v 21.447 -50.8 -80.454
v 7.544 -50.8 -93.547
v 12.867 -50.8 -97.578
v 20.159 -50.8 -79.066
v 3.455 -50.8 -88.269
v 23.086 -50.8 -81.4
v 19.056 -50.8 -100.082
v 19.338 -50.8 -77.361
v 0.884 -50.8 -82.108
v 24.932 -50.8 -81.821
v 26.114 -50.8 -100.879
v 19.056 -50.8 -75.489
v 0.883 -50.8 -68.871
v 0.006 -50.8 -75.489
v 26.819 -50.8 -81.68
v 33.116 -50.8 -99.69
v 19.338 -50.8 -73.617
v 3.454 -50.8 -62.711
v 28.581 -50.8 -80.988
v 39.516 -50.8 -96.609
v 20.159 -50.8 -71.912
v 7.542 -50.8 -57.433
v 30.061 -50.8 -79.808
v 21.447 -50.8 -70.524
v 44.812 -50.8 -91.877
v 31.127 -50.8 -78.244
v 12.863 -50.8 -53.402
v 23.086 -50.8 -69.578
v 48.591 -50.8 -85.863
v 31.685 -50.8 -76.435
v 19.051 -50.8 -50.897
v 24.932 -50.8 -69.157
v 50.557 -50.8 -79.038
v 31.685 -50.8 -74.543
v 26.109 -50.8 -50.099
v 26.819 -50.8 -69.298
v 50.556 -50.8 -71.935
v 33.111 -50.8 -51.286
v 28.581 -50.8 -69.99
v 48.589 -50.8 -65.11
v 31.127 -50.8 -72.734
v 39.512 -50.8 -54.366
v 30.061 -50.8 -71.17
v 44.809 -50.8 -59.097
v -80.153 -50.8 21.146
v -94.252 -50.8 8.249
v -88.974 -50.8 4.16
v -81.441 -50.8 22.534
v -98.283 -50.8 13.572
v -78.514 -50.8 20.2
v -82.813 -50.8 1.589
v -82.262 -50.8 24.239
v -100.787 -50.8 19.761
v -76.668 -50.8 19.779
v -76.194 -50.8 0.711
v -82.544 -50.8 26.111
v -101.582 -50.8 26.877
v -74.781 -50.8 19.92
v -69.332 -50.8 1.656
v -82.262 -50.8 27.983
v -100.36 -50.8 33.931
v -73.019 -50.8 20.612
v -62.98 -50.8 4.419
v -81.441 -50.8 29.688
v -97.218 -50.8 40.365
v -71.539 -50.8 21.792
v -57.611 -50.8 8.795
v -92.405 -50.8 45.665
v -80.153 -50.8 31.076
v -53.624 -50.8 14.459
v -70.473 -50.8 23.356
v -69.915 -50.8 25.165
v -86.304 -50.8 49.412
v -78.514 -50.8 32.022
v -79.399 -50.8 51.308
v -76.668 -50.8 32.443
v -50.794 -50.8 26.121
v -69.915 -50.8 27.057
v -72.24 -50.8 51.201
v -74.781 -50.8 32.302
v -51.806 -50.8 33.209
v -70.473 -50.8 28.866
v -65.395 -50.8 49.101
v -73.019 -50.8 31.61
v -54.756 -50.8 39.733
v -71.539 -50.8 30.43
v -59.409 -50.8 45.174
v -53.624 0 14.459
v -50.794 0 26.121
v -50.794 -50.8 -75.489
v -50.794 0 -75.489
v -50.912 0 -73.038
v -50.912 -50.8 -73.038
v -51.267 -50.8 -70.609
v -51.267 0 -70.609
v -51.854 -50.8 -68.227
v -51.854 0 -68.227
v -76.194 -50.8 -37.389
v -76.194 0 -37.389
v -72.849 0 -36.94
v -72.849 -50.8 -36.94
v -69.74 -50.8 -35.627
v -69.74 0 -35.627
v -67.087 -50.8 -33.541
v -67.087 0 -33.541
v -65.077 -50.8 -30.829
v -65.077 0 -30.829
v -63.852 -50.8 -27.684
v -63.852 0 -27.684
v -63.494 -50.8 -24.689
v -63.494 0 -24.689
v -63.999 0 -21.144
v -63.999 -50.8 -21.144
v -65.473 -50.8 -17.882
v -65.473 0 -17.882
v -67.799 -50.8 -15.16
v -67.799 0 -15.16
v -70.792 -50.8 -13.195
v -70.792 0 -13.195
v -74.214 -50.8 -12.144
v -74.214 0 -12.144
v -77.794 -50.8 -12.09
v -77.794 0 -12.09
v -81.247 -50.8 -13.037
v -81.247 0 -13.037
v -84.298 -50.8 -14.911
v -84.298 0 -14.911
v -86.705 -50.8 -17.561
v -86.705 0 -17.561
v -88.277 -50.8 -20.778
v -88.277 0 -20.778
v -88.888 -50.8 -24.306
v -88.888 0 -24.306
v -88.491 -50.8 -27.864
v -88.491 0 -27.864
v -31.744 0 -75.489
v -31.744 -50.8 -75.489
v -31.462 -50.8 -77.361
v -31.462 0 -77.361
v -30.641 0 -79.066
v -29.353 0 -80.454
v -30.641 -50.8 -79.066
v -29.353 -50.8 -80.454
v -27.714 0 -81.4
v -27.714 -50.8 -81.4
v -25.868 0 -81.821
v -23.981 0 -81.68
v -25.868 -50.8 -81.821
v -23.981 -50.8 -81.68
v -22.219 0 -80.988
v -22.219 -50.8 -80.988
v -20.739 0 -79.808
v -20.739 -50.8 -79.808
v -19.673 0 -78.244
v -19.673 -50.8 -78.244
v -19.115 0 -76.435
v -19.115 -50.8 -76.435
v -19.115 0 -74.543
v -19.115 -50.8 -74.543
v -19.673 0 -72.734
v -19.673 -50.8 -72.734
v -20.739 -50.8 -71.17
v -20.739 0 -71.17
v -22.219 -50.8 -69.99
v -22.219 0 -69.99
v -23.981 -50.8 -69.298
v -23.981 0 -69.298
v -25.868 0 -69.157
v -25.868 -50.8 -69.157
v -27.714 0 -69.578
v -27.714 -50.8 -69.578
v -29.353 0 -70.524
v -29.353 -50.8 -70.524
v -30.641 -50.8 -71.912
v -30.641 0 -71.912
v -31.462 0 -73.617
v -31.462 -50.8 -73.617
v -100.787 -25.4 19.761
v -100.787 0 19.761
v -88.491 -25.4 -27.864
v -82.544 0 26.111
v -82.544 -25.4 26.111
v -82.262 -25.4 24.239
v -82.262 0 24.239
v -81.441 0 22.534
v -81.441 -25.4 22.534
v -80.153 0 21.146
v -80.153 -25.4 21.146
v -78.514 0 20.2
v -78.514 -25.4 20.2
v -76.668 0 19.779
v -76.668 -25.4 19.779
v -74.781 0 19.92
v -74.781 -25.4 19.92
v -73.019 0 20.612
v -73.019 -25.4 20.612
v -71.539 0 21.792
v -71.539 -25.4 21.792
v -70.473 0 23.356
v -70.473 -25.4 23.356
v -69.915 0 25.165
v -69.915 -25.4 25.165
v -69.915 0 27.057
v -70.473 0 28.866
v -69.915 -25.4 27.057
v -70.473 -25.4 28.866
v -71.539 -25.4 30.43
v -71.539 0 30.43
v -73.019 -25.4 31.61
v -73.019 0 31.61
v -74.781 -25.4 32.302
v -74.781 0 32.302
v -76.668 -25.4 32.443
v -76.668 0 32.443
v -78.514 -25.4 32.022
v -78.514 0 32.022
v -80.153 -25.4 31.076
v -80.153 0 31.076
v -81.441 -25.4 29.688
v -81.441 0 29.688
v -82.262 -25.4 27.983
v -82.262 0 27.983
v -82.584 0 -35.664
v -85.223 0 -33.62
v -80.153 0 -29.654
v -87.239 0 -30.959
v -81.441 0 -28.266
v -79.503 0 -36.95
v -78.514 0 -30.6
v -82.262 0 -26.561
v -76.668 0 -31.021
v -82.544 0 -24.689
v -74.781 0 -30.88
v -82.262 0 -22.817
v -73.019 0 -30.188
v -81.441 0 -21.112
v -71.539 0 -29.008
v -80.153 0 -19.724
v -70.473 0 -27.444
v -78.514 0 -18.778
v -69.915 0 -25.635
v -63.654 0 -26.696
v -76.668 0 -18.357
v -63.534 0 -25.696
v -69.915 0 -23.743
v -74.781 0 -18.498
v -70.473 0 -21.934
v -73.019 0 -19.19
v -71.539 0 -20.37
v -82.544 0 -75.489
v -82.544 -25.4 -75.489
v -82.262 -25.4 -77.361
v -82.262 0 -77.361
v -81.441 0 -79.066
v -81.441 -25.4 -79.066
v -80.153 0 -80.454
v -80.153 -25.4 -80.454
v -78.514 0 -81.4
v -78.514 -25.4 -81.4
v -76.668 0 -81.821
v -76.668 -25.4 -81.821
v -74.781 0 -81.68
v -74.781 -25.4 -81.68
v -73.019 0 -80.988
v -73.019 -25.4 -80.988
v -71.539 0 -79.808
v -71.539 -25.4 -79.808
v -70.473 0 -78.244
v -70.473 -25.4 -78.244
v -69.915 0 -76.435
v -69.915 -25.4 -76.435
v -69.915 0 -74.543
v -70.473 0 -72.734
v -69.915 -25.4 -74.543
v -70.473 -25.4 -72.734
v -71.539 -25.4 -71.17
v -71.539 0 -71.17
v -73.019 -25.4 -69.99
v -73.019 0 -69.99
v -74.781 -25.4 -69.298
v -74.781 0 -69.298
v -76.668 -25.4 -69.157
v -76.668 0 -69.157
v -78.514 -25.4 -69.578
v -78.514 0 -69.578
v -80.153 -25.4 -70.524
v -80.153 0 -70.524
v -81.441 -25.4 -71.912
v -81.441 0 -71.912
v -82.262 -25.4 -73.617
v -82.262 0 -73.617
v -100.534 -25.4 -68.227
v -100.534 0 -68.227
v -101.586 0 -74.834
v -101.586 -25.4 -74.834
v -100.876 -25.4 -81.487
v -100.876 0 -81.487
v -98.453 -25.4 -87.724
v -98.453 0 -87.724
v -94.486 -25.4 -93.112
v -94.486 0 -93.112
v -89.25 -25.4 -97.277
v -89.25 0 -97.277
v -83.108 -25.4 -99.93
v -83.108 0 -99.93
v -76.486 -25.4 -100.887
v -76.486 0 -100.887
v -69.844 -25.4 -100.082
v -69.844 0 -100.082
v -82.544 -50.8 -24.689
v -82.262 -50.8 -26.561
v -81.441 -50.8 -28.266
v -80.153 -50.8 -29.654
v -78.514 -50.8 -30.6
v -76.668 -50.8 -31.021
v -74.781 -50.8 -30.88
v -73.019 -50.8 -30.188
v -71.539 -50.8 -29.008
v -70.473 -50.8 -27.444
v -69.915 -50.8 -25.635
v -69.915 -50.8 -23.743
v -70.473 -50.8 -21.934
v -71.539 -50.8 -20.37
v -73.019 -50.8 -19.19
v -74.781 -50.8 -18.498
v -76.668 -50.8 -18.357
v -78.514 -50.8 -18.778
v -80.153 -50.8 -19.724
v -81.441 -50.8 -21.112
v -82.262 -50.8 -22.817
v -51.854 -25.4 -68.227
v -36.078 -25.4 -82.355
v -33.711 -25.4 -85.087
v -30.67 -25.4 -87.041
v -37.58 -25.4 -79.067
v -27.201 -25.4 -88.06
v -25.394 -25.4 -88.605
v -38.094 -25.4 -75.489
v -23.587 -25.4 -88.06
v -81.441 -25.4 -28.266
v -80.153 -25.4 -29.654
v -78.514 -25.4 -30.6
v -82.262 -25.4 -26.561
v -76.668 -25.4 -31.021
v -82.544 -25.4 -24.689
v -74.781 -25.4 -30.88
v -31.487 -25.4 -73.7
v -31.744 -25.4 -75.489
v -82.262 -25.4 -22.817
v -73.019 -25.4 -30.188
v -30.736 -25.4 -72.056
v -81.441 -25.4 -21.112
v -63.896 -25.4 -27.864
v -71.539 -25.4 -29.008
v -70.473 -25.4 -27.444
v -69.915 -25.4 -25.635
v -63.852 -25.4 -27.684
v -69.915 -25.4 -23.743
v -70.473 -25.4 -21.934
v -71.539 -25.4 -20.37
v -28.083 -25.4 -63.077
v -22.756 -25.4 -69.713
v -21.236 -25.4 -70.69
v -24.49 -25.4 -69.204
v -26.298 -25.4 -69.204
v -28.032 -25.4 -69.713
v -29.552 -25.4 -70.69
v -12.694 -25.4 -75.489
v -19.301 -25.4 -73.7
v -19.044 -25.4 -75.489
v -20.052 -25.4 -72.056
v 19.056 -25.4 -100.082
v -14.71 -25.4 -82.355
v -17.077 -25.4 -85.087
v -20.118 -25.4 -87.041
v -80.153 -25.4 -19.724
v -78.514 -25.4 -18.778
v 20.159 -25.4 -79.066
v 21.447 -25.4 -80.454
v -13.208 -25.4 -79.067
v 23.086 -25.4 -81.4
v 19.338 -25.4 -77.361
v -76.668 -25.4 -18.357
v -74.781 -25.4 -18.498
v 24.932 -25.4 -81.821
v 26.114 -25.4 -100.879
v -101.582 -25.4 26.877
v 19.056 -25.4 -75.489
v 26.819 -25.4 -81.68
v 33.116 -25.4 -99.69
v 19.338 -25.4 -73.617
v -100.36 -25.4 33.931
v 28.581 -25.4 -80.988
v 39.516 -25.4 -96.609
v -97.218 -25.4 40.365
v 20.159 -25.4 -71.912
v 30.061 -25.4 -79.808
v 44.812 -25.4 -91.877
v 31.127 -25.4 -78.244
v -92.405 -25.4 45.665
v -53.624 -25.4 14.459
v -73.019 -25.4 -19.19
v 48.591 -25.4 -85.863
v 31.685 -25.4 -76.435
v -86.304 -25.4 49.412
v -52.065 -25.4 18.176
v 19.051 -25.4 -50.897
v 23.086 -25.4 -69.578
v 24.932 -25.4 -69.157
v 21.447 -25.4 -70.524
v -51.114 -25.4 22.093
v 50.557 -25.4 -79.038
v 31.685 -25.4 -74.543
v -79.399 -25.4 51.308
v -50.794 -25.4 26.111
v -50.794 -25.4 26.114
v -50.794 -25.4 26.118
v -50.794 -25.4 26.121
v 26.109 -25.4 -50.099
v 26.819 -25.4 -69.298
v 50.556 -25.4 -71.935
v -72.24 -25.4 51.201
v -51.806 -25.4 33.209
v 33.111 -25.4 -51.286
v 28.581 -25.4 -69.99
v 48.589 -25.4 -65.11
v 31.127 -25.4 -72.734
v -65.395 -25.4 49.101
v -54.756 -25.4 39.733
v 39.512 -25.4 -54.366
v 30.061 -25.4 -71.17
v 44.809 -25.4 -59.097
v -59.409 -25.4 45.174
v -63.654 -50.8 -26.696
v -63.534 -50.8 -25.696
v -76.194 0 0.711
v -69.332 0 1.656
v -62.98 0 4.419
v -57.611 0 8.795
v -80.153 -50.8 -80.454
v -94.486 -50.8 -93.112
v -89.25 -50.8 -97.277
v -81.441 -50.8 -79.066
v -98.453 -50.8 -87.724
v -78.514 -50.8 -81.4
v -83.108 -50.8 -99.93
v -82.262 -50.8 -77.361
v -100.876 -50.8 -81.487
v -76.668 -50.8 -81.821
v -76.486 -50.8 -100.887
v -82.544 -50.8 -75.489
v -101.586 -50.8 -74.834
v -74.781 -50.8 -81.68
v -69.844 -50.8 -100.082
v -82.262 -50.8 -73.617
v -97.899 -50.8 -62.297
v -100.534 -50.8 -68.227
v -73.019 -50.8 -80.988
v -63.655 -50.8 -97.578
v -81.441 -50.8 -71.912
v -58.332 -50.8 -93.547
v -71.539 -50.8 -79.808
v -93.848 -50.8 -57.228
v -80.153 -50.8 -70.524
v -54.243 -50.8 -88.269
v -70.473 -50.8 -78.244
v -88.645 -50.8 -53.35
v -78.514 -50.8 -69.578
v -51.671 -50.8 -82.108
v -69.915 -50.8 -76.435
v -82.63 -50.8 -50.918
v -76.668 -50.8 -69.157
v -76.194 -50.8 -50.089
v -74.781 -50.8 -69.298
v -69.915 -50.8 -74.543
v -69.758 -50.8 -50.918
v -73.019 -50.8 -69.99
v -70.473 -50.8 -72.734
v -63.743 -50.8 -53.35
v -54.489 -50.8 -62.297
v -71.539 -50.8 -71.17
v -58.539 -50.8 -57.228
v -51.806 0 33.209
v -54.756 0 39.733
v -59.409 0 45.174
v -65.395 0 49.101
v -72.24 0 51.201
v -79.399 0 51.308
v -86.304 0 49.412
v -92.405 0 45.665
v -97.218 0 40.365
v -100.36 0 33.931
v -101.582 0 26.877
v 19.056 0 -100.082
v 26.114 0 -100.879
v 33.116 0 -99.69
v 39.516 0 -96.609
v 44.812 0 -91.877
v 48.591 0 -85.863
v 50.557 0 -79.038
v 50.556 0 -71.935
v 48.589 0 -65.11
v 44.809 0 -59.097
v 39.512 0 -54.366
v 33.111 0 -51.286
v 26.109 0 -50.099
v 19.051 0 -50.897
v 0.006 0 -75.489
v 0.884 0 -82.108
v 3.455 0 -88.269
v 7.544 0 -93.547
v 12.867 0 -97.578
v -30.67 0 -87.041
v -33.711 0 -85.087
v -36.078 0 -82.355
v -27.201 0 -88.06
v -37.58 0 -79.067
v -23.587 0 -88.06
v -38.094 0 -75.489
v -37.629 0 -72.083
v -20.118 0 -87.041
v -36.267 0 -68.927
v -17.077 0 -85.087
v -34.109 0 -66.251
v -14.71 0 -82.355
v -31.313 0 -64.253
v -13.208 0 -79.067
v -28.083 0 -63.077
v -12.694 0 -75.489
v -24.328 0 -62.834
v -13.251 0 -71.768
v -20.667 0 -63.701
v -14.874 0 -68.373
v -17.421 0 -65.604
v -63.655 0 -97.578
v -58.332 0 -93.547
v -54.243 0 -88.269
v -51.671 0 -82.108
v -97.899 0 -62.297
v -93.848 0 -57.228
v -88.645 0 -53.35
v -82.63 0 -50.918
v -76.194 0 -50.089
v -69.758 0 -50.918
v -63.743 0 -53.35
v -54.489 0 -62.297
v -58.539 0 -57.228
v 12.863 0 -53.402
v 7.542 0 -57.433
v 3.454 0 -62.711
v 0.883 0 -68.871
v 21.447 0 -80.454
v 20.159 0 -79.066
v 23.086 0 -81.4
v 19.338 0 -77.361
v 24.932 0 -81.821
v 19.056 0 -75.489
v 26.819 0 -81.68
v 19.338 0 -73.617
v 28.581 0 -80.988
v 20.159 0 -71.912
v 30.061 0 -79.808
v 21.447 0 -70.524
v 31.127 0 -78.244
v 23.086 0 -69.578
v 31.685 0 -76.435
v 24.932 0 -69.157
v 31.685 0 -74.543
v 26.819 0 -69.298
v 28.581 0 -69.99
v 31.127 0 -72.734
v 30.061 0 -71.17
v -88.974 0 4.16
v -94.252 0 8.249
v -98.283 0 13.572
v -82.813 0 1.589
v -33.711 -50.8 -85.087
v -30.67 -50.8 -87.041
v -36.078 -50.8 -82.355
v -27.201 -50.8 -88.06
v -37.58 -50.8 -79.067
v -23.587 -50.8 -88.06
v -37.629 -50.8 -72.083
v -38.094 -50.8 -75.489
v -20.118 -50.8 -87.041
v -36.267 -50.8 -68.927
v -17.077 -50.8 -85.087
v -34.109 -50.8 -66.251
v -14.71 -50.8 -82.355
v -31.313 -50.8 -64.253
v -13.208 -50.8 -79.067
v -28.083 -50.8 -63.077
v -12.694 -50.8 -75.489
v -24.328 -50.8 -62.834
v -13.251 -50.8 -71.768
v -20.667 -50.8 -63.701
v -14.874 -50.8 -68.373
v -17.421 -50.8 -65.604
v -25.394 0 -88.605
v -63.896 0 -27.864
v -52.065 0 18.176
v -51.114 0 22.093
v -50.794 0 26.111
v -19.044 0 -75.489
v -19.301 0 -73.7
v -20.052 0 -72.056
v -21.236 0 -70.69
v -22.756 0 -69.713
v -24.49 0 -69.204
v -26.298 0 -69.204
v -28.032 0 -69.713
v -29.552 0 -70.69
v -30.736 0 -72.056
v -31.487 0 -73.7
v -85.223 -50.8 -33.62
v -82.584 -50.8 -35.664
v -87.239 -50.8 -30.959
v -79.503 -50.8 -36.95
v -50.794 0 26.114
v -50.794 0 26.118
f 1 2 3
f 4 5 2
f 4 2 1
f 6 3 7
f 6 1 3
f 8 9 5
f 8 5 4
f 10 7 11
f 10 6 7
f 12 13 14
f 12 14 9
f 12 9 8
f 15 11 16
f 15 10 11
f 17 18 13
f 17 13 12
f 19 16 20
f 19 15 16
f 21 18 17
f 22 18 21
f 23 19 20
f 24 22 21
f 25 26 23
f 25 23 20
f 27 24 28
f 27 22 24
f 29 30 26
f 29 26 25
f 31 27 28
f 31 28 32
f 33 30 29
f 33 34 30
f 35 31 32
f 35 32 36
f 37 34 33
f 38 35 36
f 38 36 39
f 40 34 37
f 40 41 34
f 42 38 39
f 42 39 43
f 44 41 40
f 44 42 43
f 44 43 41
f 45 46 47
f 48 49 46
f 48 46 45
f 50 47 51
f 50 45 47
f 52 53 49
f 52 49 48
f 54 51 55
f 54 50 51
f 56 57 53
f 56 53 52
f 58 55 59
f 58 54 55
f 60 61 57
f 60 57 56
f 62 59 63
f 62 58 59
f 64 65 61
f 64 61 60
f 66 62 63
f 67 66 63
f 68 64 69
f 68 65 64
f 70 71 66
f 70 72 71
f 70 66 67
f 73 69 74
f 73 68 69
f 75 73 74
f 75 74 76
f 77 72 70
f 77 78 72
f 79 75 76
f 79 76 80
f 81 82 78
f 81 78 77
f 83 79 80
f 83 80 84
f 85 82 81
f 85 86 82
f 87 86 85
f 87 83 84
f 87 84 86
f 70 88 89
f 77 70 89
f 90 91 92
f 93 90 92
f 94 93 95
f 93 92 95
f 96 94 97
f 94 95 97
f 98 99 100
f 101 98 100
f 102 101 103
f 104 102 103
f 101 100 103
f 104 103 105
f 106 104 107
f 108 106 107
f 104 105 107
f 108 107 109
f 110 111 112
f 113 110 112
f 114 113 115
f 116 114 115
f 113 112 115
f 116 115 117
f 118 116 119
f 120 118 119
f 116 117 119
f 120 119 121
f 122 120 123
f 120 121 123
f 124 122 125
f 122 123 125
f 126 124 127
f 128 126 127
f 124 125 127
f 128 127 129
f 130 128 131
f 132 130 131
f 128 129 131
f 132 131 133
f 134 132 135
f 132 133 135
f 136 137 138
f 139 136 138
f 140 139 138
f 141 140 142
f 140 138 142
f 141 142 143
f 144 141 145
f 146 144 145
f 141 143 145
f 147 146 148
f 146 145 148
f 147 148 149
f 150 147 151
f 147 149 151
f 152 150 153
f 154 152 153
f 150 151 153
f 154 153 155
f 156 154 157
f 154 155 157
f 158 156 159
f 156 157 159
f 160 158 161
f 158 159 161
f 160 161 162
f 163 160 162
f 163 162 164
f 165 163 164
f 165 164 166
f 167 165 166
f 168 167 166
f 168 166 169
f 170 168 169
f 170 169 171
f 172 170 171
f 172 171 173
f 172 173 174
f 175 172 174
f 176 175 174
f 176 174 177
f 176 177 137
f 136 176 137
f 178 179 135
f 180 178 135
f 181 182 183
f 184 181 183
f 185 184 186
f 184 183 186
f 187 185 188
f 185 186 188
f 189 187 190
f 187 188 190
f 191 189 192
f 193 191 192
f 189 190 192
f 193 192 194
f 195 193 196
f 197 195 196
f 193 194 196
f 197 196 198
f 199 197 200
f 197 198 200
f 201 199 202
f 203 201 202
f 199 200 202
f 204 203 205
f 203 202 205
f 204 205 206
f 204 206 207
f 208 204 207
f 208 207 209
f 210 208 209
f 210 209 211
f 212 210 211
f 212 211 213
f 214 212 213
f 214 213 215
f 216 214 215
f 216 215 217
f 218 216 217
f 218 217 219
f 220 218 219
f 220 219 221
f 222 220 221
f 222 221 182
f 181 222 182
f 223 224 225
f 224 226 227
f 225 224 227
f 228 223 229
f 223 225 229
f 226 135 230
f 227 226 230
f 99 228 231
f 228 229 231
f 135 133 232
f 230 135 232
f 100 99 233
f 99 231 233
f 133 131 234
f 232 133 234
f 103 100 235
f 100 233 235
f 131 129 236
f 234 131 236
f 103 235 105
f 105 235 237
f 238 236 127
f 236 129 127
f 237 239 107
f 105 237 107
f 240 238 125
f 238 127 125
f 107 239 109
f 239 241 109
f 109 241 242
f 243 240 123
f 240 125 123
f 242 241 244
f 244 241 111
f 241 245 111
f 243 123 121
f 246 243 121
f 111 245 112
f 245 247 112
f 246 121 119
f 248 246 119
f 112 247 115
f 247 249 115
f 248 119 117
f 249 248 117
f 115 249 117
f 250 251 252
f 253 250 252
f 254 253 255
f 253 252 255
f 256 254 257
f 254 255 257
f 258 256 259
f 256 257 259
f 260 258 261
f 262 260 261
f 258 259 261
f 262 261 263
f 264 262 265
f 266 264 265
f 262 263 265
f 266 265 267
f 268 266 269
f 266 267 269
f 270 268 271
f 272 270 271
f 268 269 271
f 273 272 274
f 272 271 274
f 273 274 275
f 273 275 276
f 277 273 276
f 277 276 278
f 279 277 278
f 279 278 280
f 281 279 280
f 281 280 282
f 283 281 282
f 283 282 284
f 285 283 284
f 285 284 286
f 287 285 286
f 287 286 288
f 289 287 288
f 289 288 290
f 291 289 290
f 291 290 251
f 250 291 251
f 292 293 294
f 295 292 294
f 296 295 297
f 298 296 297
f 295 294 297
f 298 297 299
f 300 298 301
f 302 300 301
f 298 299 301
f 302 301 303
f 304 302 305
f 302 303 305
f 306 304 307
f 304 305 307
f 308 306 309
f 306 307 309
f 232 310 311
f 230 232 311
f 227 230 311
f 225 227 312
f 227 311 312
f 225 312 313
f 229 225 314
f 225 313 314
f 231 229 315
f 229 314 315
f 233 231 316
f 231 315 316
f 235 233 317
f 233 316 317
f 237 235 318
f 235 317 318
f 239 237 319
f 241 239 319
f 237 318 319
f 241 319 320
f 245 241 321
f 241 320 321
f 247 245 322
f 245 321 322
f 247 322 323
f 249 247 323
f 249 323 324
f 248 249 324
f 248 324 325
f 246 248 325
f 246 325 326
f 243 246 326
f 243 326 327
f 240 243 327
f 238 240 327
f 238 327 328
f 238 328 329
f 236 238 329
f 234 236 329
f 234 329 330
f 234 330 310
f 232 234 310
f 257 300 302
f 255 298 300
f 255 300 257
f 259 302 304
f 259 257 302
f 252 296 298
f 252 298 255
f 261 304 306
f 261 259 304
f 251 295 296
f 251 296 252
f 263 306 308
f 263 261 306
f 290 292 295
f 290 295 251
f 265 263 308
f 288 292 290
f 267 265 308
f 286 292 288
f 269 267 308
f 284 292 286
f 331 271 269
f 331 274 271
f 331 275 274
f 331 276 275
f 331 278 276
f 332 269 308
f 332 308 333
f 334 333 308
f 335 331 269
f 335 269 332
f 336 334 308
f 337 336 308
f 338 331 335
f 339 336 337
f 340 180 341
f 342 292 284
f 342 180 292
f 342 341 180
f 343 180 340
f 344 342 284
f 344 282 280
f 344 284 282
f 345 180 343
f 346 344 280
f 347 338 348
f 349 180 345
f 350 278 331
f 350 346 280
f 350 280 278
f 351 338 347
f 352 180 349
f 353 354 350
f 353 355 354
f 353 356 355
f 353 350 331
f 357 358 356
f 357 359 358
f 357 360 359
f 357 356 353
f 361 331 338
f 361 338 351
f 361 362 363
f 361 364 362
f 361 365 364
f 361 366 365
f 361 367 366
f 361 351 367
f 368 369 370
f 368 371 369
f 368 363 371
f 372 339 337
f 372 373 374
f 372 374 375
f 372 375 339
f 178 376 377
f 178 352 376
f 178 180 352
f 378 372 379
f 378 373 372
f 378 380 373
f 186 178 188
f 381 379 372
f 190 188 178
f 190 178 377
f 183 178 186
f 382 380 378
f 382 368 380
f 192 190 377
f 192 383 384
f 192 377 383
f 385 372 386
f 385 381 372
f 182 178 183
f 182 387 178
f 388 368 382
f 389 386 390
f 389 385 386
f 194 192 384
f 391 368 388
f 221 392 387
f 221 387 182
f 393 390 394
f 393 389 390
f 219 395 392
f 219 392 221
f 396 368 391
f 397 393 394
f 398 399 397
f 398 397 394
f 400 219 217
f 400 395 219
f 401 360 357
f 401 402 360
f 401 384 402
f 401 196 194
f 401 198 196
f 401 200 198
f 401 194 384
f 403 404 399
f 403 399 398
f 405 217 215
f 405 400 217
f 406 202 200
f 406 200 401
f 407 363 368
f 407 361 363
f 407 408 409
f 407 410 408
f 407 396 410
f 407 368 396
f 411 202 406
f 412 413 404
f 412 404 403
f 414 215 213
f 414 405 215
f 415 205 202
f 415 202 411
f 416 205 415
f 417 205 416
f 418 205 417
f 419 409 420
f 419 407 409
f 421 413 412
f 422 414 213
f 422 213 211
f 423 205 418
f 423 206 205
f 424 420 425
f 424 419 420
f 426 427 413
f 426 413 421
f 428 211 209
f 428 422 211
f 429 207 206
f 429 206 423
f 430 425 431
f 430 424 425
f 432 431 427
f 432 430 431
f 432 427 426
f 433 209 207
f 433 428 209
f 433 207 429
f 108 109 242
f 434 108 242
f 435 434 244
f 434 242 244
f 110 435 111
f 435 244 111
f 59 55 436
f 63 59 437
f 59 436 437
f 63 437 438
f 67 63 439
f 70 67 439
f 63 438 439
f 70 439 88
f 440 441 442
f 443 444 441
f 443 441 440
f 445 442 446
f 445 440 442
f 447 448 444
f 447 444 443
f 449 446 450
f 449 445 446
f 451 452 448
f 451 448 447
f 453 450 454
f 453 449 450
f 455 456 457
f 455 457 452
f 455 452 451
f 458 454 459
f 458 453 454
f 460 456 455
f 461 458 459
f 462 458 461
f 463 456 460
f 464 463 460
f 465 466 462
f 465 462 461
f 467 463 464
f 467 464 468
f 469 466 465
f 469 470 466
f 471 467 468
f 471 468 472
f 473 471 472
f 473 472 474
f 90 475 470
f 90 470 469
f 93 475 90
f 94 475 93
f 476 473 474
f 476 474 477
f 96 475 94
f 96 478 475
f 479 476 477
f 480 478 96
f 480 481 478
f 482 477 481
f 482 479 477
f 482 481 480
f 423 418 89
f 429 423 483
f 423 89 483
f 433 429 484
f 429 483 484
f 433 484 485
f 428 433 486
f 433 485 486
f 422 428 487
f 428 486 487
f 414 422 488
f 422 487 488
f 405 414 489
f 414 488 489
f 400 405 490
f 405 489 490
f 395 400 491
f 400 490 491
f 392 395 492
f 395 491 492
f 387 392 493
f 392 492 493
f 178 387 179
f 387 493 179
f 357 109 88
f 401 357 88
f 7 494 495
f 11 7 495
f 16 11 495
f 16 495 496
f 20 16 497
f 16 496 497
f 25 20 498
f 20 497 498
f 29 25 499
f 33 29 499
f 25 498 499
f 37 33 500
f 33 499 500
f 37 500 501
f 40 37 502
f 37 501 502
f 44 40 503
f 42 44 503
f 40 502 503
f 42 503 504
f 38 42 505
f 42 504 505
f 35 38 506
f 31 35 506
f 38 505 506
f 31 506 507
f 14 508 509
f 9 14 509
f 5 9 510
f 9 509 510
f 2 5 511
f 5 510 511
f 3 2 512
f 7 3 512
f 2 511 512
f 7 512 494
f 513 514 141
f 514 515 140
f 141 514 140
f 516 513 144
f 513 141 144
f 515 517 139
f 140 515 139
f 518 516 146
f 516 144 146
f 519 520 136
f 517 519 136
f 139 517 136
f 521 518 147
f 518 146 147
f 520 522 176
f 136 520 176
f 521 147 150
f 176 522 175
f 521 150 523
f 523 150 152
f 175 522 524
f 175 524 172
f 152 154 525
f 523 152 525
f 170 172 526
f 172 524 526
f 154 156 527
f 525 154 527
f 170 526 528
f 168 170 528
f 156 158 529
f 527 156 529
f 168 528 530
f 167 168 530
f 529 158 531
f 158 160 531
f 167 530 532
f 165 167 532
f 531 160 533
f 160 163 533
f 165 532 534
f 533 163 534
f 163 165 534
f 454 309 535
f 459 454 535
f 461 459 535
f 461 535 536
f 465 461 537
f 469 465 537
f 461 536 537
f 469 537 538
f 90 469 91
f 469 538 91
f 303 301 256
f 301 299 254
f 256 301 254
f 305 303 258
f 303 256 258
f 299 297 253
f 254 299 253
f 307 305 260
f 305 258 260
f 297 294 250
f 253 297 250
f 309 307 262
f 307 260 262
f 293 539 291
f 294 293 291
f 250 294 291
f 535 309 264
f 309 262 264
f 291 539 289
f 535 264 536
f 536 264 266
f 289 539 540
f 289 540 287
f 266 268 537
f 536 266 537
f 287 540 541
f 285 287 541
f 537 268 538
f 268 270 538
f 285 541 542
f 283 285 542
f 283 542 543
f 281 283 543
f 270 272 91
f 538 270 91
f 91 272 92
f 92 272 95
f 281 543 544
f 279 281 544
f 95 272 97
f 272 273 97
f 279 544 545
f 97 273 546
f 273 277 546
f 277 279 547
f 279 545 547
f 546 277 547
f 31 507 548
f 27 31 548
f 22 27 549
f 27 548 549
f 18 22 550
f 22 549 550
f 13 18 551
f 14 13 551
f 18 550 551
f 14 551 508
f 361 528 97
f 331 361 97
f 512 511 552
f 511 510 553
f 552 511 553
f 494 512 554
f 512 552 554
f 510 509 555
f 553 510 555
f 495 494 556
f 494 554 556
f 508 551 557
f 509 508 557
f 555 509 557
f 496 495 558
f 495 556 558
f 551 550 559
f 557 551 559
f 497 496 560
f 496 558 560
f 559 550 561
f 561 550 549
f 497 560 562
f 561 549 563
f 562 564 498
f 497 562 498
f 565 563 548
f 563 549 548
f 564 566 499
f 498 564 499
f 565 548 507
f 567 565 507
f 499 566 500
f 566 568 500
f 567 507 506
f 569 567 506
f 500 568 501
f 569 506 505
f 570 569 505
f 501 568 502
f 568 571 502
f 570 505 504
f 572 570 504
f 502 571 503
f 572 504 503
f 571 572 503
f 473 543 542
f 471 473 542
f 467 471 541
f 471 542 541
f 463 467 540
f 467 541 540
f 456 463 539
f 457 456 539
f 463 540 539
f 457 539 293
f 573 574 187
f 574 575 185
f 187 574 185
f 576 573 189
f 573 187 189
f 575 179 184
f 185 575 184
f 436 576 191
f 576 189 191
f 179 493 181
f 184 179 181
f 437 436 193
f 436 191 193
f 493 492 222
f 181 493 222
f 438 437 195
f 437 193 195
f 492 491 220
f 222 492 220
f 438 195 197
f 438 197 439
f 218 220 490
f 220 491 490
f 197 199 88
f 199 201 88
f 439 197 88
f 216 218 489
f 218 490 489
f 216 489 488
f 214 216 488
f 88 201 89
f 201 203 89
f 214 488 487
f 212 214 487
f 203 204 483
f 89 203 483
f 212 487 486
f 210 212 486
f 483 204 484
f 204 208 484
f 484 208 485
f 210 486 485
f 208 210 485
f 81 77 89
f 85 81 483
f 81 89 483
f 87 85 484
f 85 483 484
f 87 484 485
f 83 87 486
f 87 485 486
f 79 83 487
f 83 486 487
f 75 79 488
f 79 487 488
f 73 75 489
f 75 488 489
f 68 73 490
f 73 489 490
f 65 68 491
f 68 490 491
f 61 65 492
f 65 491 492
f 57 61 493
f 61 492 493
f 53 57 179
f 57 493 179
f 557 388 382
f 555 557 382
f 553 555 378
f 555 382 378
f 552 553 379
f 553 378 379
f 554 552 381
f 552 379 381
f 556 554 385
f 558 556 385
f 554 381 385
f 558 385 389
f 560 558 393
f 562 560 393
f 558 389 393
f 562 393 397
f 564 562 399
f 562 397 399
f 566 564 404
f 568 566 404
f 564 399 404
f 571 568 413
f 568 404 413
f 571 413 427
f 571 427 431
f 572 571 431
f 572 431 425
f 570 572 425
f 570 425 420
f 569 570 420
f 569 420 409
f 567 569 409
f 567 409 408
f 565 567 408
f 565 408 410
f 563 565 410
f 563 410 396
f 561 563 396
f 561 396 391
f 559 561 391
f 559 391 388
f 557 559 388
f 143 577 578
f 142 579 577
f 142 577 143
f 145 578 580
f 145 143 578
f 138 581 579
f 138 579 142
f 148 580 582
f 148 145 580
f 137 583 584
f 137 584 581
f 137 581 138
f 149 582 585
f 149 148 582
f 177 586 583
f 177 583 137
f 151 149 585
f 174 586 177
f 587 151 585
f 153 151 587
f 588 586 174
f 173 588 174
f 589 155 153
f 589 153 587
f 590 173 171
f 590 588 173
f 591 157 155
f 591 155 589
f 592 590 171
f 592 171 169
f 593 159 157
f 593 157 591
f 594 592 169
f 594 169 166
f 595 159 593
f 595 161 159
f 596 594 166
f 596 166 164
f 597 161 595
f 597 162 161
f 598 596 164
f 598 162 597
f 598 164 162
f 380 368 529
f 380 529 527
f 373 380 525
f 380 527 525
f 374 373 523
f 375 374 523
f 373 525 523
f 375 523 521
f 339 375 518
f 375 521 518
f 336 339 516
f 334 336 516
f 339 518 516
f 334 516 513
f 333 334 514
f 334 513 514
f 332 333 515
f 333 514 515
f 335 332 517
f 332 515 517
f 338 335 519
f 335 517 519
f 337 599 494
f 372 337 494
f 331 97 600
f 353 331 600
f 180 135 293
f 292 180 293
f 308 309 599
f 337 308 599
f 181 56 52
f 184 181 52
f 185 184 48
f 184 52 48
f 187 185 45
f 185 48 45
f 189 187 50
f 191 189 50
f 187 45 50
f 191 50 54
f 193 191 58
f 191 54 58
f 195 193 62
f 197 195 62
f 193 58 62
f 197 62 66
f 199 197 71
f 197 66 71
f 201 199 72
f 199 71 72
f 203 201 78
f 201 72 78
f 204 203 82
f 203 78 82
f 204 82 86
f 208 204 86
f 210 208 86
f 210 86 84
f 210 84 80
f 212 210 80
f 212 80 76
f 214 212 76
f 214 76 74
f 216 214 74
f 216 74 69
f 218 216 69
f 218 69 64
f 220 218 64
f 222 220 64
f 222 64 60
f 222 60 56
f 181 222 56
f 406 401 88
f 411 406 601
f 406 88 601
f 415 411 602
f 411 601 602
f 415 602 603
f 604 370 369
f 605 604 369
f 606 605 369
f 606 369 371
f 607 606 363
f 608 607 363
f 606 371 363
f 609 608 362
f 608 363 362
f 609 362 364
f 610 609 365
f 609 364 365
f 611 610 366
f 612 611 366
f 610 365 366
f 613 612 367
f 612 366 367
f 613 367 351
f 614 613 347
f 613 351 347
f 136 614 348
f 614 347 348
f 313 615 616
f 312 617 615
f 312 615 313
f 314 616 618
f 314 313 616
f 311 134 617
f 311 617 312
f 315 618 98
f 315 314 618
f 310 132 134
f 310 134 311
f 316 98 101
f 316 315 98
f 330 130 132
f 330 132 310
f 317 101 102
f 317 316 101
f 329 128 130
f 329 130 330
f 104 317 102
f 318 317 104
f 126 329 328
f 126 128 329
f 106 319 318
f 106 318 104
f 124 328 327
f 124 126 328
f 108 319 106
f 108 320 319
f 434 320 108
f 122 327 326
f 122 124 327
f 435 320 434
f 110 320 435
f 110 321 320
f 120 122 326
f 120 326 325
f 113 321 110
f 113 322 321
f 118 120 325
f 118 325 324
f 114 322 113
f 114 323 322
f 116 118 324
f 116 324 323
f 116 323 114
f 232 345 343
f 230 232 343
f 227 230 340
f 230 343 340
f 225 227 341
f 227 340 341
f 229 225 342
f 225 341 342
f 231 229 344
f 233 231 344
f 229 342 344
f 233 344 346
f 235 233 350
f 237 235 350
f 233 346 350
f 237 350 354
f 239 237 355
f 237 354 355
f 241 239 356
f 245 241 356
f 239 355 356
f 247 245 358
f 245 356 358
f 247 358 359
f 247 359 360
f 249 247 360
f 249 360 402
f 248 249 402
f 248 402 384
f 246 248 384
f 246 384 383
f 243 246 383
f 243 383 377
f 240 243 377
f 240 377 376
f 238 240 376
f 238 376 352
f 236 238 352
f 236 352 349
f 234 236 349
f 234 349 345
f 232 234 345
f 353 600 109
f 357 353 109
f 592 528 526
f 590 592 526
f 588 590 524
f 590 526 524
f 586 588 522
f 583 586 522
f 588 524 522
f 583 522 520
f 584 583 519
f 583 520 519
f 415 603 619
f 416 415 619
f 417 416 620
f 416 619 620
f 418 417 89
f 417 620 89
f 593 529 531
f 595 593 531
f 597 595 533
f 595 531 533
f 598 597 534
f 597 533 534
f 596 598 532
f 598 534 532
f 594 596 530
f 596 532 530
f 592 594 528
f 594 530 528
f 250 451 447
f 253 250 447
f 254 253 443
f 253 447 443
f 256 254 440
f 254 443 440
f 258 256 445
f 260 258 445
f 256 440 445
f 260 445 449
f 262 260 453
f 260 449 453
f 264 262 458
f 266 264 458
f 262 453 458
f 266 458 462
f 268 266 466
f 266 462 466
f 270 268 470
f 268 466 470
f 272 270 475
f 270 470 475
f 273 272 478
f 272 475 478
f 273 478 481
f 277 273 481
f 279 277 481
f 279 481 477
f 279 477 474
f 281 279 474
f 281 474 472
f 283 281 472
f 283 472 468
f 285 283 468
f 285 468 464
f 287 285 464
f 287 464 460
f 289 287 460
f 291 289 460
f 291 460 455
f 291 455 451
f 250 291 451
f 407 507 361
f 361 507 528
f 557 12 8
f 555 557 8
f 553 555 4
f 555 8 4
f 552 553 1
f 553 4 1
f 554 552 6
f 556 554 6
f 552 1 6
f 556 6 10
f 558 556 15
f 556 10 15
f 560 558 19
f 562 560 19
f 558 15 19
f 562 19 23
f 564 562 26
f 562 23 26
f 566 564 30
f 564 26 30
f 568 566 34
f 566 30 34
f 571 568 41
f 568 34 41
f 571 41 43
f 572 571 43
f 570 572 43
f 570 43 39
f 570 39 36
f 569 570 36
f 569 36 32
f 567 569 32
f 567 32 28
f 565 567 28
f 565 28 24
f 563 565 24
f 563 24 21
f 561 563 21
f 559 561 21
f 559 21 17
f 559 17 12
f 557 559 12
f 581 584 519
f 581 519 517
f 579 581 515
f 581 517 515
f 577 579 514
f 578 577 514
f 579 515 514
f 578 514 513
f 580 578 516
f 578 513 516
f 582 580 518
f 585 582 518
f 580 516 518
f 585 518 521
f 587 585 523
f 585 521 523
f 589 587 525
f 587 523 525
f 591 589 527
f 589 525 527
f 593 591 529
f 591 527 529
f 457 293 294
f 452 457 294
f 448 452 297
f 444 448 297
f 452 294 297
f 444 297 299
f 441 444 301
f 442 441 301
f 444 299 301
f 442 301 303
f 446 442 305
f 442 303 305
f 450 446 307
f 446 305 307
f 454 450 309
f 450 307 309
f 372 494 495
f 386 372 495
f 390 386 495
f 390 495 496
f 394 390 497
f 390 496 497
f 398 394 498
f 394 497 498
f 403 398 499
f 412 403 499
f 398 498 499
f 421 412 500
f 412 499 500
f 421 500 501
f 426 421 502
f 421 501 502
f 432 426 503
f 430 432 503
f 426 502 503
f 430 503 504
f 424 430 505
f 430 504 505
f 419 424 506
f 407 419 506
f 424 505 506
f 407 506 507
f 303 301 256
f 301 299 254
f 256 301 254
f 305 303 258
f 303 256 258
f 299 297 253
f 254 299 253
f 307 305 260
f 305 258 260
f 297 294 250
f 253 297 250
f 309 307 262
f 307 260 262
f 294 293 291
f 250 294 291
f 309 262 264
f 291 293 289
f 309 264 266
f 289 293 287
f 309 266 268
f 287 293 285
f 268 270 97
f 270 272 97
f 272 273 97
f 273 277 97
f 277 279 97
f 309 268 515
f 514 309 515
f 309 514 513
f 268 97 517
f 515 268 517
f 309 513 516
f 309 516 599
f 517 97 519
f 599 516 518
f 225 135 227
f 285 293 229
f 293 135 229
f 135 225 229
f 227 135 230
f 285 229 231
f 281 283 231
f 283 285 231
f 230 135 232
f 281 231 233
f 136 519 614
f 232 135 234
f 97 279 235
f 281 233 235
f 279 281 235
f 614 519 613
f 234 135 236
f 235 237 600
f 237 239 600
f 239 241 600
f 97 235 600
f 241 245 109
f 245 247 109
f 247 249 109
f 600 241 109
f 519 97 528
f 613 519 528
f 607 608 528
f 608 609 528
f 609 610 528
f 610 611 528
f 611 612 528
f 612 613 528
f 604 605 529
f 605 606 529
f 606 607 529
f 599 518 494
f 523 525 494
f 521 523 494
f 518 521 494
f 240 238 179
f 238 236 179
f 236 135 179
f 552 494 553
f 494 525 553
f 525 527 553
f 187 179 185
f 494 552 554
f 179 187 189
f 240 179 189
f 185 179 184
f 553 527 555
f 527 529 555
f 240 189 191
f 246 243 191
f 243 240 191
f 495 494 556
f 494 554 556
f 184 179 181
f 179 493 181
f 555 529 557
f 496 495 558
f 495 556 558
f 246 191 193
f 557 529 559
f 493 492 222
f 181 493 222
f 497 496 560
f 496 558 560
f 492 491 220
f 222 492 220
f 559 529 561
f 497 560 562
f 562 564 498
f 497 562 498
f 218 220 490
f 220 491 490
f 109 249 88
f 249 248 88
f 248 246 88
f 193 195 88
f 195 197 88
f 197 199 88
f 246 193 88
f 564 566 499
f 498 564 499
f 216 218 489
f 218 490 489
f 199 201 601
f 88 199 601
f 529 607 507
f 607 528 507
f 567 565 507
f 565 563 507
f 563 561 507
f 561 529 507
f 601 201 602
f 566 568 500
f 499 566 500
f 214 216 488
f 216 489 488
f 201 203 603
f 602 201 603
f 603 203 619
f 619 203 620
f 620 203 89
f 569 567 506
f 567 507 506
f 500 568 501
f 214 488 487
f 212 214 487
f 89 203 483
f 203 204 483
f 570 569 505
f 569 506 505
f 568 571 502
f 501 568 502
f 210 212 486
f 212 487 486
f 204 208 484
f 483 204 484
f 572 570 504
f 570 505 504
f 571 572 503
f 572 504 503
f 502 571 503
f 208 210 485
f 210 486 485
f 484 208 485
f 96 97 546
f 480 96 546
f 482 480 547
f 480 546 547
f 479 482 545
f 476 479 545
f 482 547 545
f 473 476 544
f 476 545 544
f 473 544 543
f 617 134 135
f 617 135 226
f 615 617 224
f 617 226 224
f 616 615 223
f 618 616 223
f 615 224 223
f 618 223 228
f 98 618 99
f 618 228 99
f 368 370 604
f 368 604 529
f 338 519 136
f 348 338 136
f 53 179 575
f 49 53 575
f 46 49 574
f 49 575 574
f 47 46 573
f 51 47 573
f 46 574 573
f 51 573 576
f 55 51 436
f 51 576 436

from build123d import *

# Parameters (mm, degrees)
F1_DEPTH = 50.8
F2_DEPTH = 25.4
F3_D     = 12.7
F3_2_D   = 12.7
F3_3_D   = 12.7
F3_4_D   = 12.7
F3_5_D   = 12.7
F3_6_D   = 12.7


with BuildPart() as f1:
    # F0 (on Front) → F1 (new body)
    with BuildSketch(Plane.XZ):
        with BuildLine():
            ThreePointArc((-50.7939492653, 26.1209367481), (-79.3993552685, 51.3079916788), (-100.7873915934, 19.7610601187))
            ThreePointArc((-100.7873915934, 19.7610601187), (-91.7482072117, 6.0305969766), (-76.193947345, 0.7110601187))
            ThreePointArc((-76.193947345, 0.7110601187), (-62.9802916851, 4.4186811781), (-53.6242130328, 14.45914641))
            Line((-53.6242130328, 14.45914641), (-50.7939492653, 26.1209367481))
        make_face()
    extrude(amount=F1_DEPTH)

    # F3 (through all)
    with Locations(Plane(origin=(0, 0, 0), x_dir=(1, 0, 0), z_dir=(0, 1, 0))):
        with Locations((-76.193947345, -26.1110601187), (-76.193947345, 24.6889398813), (-76.193947345, 75.4889398813), (-25.393947345, 75.4889398813), (25.406052655, 75.4889398813)):
            Hole(F3_D / 2)


with BuildPart() as f1b:
    # F0 (on Front) → F1, piece 2 (new body)
    with BuildSketch(Plane.XZ):
        with BuildLine():
            ThreePointArc((-88.4906694692, -27.8639398813), (-83.9710772784, -34.7291714524), (-76.193947345, -37.3889398813))
            Line((-76.193947345, -37.3889398813), (-76.193947345, -24.6889398813))
            Line((-76.193947345, -24.6889398813), (-76.193947345, -11.9889398813))
            ThreePointArc((-76.193947345, -11.9889398813), (-86.2341789161, -16.911809948), (-88.4906694692, -27.8639398813))
        make_face()
        with BuildLine():
            Line((-76.193947345, -24.6889398813), (-76.193947345, -37.3889398813))
            ThreePointArc((-76.193947345, -37.3889398813), (-68.3437906638, -34.6721778371), (-63.8522178745, -27.6842217838))
            ThreePointArc((-63.8522178745, -27.6842217838), (-63.5838330657, -26.1972561154), (-63.493947345, -24.6889398813))
            ThreePointArc((-63.493947345, -24.6889398813), (-67.2136912239, -15.7086837603), (-76.193947345, -11.9889398813))
            Line((-76.193947345, -11.9889398813), (-76.193947345, -24.6889398813))
        make_face()
    extrude(amount=F1_DEPTH)

    # F3#2 (through all)
    with Locations(Plane(origin=(0, 0, 0), x_dir=(1, 0, 0), z_dir=(0, 1, 0))):
        with Locations((-76.193947345, -26.1110601187), (-76.193947345, 24.6889398813), (-76.193947345, 75.4889398813), (-25.393947345, 75.4889398813), (25.406052655, 75.4889398813)):
            Hole(F3_2_D / 2)


with BuildPart() as f1c:
    # F0 (on Front) → F1, piece 3 (new body)
    with BuildSketch(Plane.XZ):
        with BuildLine():
            Line((-50.793947345, -75.4889398813), (-76.193947345, -75.4889398813))
            Line((-76.193947345, -75.4889398813), (-76.193947345, -50.0889398813))
            ThreePointArc((-76.193947345, -50.0889398813), (-91.3712413096, -55.122061183), (-100.5336406636, -68.2267550063))
            ThreePointArc((-100.5336406636, -68.2267550063), (-94.4860916462, -93.1115803436), (-69.843947345, -100.0823841297))
            ThreePointArc((-69.843947345, -100.0823841297), (-56.1134842029, -91.043199748), (-50.793947345, -75.4889398813))
        make_face()
        with BuildLine():
            Line((-76.193947345, -50.0889398813), (-76.193947345, -75.4889398813))
            Line((-76.193947345, -75.4889398813), (-50.793947345, -75.4889398813))
            ThreePointArc((-50.793947345, -75.4889398813), (-51.0604218231, -71.8193493264), (-51.8542540254, -68.2267550099))
            ThreePointArc((-51.8542540254, -68.2267550099), (-61.0166533789, -55.1220611841), (-76.193947345, -50.0889398813))
        make_face()
    extrude(amount=F1_DEPTH)

    # F3#3 (through all)
    with Locations(Plane(origin=(0, 0, 0), x_dir=(1, 0, 0), z_dir=(0, 1, 0))):
        with Locations((-76.193947345, -26.1110601187), (-76.193947345, 24.6889398813), (-76.193947345, 75.4889398813), (-25.393947345, 75.4889398813), (25.406052655, 75.4889398813)):
            Hole(F3_3_D / 2)


with BuildPart() as f1d:
    # F0 (on Front) → F1, piece 4 (new body)
    with BuildSketch(Plane.XZ):
        with BuildLine():
            ThreePointArc((-28.0829291685, -63.0768741083), (-35.279291779, -67.5158623437), (-38.093947345, -75.4889398813))
            Line((-38.093947345, -75.4889398813), (-25.393947345, -75.4889398813))
            Line((-25.393947345, -75.4889398813), (-12.693947345, -75.4889398813))
            ThreePointArc((-12.693947345, -75.4889398813), (-17.4208698074, -65.6035954473), (-28.0829291685, -63.0768741083))
        make_face()
        with BuildLine():
            Line((-25.393947345, -75.4889398813), (-38.093947345, -75.4889398813))
            ThreePointArc((-38.093947345, -75.4889398813), (-25.393947345, -88.1889398813), (-12.693947345, -75.4889398813))
            Line((-12.693947345, -75.4889398813), (-25.393947345, -75.4889398813))
        make_face()
    extrude(amount=F1_DEPTH)

    # F3#4 (through all)
    with Locations(Plane(origin=(0, 0, 0), x_dir=(1, 0, 0), z_dir=(0, 1, 0))):
        with Locations((-76.193947345, -26.1110601187), (-76.193947345, 24.6889398813), (-76.193947345, 75.4889398813), (-25.393947345, 75.4889398813), (25.406052655, 75.4889398813)):
            Hole(F3_4_D / 2)


with BuildPart() as f1e:
    # F0 (on Front) → F1, piece 5 (new body)
    with BuildSketch(Plane.XZ):
        with BuildLine():
            ThreePointArc((50.806052655, -75.4889398813), (40.958286546, -55.4069075888), (19.0510903716, -50.896777423))
            ThreePointArc((19.0510903716, -50.896777423), (5.3240203624, -59.9367059903), (0.006052655, -75.4889398813))
            ThreePointArc((0.006052655, -75.4889398813), (5.3255895129, -91.043199748), (19.056052655, -100.0823841297))
            ThreePointArc((19.056052655, -100.0823841297), (40.9603125217, -95.5694030234), (50.806052655, -75.4889398813))
        make_face()
    extrude(amount=F1_DEPTH)

    # F3#5 (through all)
    with Locations(Plane(origin=(0, 0, 0), x_dir=(1, 0, 0), z_dir=(0, 1, 0))):
        with Locations((-76.193947345, -26.1110601187), (-76.193947345, 24.6889398813), (-76.193947345, 75.4889398813), (-25.393947345, 75.4889398813), (25.406052655, 75.4889398813)):
            Hole(F3_5_D / 2)


with BuildPart() as f2:
    # F0 (on Front) → F2 (new body)
    with BuildSketch(Plane.XZ):
        with BuildLine():
            Line((-76.193947345, -50.0889398813), (-76.193947345, -75.4889398813))
            Line((-76.193947345, -75.4889398813), (-50.793947345, -75.4889398813))
            ThreePointArc((-50.793947345, -75.4889398813), (-51.0604218231, -71.8193493264), (-51.8542540254, -68.2267550099))
            ThreePointArc((-51.8542540254, -68.2267550099), (-61.0166533789, -55.1220611841), (-76.193947345, -50.0889398813))
        make_face()
        with BuildLine():
            Line((-50.793947345, -75.4889398813), (-76.193947345, -75.4889398813))
            Line((-76.193947345, -75.4889398813), (-76.193947345, -50.0889398813))
            ThreePointArc((-76.193947345, -50.0889398813), (-91.3712413096, -55.122061183), (-100.5336406636, -68.2267550063))
            ThreePointArc((-100.5336406636, -68.2267550063), (-94.4860916462, -93.1115803436), (-69.843947345, -100.0823841297))
            ThreePointArc((-69.843947345, -100.0823841297), (-56.1134842029, -91.043199748), (-50.793947345, -75.4889398813))
        make_face()
        with BuildLine():
            ThreePointArc((-51.8542540254, -68.2267550099), (-51.0604218231, -71.8193493264), (-50.793947345, -75.4889398813))
            Line((-50.793947345, -75.4889398813), (-38.093947345, -75.4889398813))
            ThreePointArc((-38.093947345, -75.4889398813), (-35.279291779, -67.5158623437), (-28.0829291685, -63.0768741083))
            Line((-28.0829291685, -63.0768741083), (-51.8542540132, -68.2267550063))
        make_face()
        with BuildLine():
            Line((-38.093947345, -75.4889398813), (-50.793947345, -75.4889398813))
            ThreePointArc((-50.793947345, -75.4889398813), (-56.1134842029, -91.043199748), (-69.843947345, -100.0823841297))
            Line((-69.843947345, -100.0823841297), (-25.393947345, -88.6054434805))
            Line((-25.393947345, -88.6054434805), (19.056052655, -100.0823841297))
            ThreePointArc((19.056052655, -100.0823841297), (5.3255895129, -91.043199748), (0.006052655, -75.4889398813))
            Line((0.006052655, -75.4889398813), (-12.693947345, -75.4889398813))
            ThreePointArc((-12.693947345, -75.4889398813), (-25.393947345, -88.1889398813), (-38.093947345, -75.4889398813))
        make_face()
        with BuildLine():
            ThreePointArc((-100.5336406636, -68.2267550063), (-91.3712413096, -55.122061183), (-76.193947345, -50.0889398813))
            Line((-76.193947345, -50.0889398813), (-76.193947345, -37.3889398813))
            ThreePointArc((-76.193947345, -37.3889398813), (-83.9710772784, -34.7291714524), (-88.4906694692, -27.8639398813))
            Line((-88.4906694692, -27.8639398813), (-100.5336406636, -68.2267550063))
        make_face()
        with BuildLine():
            Line((-76.193947345, -37.3889398813), (-76.193947345, -50.0889398813))
            ThreePointArc((-76.193947345, -50.0889398813), (-61.0166533789, -55.1220611841), (-51.8542540254, -68.2267550099))
            Line((-51.8542540132, -68.2267550063), (-63.8958346438, -27.8639398813))
            Line((-63.8958346438, -27.8639398813), (-63.8522178745, -27.6842217838))
            ThreePointArc((-63.8522178745, -27.6842217838), (-68.3437906638, -34.6721778371), (-76.193947345, -37.3889398813))
        make_face()
        with BuildLine():
            ThreePointArc((-28.0829291685, -63.0768741083), (-35.279291779, -67.5158623437), (-38.093947345, -75.4889398813))
            Line((-38.093947345, -75.4889398813), (-25.393947345, -75.4889398813))
            Line((-25.393947345, -75.4889398813), (-12.693947345, -75.4889398813))
            ThreePointArc((-12.693947345, -75.4889398813), (-17.4208698074, -65.6035954473), (-28.0829291685, -63.0768741083))
        make_face()
        with BuildLine():
            ThreePointArc((-88.4906694692, -27.8639398813), (-83.9710772784, -34.7291714524), (-76.193947345, -37.3889398813))
            Line((-76.193947345, -37.3889398813), (-76.193947345, -24.6889398813))
            Line((-76.193947345, -24.6889398813), (-76.193947345, -11.9889398813))
            ThreePointArc((-76.193947345, -11.9889398813), (-86.2341789161, -16.911809948), (-88.4906694692, -27.8639398813))
        make_face()
        with BuildLine():
            Line((-76.193947345, -24.6889398813), (-76.193947345, -37.3889398813))
            ThreePointArc((-76.193947345, -37.3889398813), (-68.3437906638, -34.6721778371), (-63.8522178745, -27.6842217838))
            ThreePointArc((-63.8522178745, -27.6842217838), (-63.5838330657, -26.1972561154), (-63.493947345, -24.6889398813))
            ThreePointArc((-63.493947345, -24.6889398813), (-67.2136912239, -15.7086837603), (-76.193947345, -11.9889398813))
            Line((-76.193947345, -11.9889398813), (-76.193947345, -24.6889398813))
        make_face()
        with BuildLine():
            Line((19.0510903716, -50.896777423), (-28.0829291685, -63.0768741083))
            ThreePointArc((-28.0829291685, -63.0768741083), (-17.4208698074, -65.6035954473), (-12.693947345, -75.4889398813))
            Line((-12.693947345, -75.4889398813), (0.006052655, -75.4889398813))
            ThreePointArc((0.006052655, -75.4889398813), (5.3240203624, -59.9367059903), (19.0510903716, -50.896777423))
        make_face()
        with BuildLine():
            Line((-100.7873915934, 19.7610601187), (-88.4906694692, -27.8639398813))
            ThreePointArc((-88.4906694692, -27.8639398813), (-86.2341789161, -16.911809948), (-76.193947345, -11.9889398813))
            Line((-76.193947345, -11.9889398813), (-76.193947345, 0.7110601187))
            ThreePointArc((-76.193947345, 0.7110601187), (-91.7482072117, 6.0305969766), (-100.7873915934, 19.7610601187))
        make_face()
        with BuildLine():
            ThreePointArc((-63.493947345, -24.6889398813), (-63.5838330657, -26.1972561154), (-63.8522178745, -27.6842217838))
            Line((-63.8522178745, -27.6842217838), (-53.6242130328, 14.45914641))
            ThreePointArc((-53.6242130328, 14.45914641), (-62.9802916851, 4.4186811781), (-76.193947345, 0.7110601187))
            Line((-76.193947345, 0.7110601187), (-76.193947345, -11.9889398813))
            ThreePointArc((-76.193947345, -11.9889398813), (-67.2136912239, -15.7086837603), (-63.493947345, -24.6889398813))
        make_face()
        with BuildLine():
            ThreePointArc((50.806052655, -75.4889398813), (40.958286546, -55.4069075888), (19.0510903716, -50.896777423))
            ThreePointArc((19.0510903716, -50.896777423), (5.3240203624, -59.9367059903), (0.006052655, -75.4889398813))
            ThreePointArc((0.006052655, -75.4889398813), (5.3255895129, -91.043199748), (19.056052655, -100.0823841297))
            ThreePointArc((19.056052655, -100.0823841297), (40.9603125217, -95.5694030234), (50.806052655, -75.4889398813))
        make_face()
        with BuildLine():
            ThreePointArc((-50.7939492653, 26.1209367481), (-79.3993552685, 51.3079916788), (-100.7873915934, 19.7610601187))
            ThreePointArc((-100.7873915934, 19.7610601187), (-91.7482072117, 6.0305969766), (-76.193947345, 0.7110601187))
            ThreePointArc((-76.193947345, 0.7110601187), (-62.9802916851, 4.4186811781), (-53.6242130328, 14.45914641))
            Line((-53.6242130328, 14.45914641), (-50.7939492653, 26.1209367481))
        make_face()
        with BuildLine():
            Line((-50.7939492653, 26.1209367481), (-53.6242130328, 14.45914641))
            ThreePointArc((-53.6242130328, 14.45914641), (-51.5116535747, 20.1156973911), (-50.793947345, 26.1110601187))
            ThreePointArc((-50.793947345, 26.1110601187), (-50.7939478251, 26.1159984335), (-50.7939492653, 26.1209367481))
        make_face()
    extrude(amount=F2_DEPTH)

    # F3#6 (through all)
    with Locations(Plane(origin=(0, 0, 0), x_dir=(1, 0, 0), z_dir=(0, 1, 0))):
        with Locations((-76.193947345, -26.1110601187), (-76.193947345, 24.6889398813), (-76.193947345, 75.4889398813), (-25.393947345, 75.4889398813), (25.406052655, 75.4889398813)):
            Hole(F3_6_D / 2)


solid = Compound([f1.part, f1b.part, f1c.part, f1d.part, f1e.part, f2.part])
